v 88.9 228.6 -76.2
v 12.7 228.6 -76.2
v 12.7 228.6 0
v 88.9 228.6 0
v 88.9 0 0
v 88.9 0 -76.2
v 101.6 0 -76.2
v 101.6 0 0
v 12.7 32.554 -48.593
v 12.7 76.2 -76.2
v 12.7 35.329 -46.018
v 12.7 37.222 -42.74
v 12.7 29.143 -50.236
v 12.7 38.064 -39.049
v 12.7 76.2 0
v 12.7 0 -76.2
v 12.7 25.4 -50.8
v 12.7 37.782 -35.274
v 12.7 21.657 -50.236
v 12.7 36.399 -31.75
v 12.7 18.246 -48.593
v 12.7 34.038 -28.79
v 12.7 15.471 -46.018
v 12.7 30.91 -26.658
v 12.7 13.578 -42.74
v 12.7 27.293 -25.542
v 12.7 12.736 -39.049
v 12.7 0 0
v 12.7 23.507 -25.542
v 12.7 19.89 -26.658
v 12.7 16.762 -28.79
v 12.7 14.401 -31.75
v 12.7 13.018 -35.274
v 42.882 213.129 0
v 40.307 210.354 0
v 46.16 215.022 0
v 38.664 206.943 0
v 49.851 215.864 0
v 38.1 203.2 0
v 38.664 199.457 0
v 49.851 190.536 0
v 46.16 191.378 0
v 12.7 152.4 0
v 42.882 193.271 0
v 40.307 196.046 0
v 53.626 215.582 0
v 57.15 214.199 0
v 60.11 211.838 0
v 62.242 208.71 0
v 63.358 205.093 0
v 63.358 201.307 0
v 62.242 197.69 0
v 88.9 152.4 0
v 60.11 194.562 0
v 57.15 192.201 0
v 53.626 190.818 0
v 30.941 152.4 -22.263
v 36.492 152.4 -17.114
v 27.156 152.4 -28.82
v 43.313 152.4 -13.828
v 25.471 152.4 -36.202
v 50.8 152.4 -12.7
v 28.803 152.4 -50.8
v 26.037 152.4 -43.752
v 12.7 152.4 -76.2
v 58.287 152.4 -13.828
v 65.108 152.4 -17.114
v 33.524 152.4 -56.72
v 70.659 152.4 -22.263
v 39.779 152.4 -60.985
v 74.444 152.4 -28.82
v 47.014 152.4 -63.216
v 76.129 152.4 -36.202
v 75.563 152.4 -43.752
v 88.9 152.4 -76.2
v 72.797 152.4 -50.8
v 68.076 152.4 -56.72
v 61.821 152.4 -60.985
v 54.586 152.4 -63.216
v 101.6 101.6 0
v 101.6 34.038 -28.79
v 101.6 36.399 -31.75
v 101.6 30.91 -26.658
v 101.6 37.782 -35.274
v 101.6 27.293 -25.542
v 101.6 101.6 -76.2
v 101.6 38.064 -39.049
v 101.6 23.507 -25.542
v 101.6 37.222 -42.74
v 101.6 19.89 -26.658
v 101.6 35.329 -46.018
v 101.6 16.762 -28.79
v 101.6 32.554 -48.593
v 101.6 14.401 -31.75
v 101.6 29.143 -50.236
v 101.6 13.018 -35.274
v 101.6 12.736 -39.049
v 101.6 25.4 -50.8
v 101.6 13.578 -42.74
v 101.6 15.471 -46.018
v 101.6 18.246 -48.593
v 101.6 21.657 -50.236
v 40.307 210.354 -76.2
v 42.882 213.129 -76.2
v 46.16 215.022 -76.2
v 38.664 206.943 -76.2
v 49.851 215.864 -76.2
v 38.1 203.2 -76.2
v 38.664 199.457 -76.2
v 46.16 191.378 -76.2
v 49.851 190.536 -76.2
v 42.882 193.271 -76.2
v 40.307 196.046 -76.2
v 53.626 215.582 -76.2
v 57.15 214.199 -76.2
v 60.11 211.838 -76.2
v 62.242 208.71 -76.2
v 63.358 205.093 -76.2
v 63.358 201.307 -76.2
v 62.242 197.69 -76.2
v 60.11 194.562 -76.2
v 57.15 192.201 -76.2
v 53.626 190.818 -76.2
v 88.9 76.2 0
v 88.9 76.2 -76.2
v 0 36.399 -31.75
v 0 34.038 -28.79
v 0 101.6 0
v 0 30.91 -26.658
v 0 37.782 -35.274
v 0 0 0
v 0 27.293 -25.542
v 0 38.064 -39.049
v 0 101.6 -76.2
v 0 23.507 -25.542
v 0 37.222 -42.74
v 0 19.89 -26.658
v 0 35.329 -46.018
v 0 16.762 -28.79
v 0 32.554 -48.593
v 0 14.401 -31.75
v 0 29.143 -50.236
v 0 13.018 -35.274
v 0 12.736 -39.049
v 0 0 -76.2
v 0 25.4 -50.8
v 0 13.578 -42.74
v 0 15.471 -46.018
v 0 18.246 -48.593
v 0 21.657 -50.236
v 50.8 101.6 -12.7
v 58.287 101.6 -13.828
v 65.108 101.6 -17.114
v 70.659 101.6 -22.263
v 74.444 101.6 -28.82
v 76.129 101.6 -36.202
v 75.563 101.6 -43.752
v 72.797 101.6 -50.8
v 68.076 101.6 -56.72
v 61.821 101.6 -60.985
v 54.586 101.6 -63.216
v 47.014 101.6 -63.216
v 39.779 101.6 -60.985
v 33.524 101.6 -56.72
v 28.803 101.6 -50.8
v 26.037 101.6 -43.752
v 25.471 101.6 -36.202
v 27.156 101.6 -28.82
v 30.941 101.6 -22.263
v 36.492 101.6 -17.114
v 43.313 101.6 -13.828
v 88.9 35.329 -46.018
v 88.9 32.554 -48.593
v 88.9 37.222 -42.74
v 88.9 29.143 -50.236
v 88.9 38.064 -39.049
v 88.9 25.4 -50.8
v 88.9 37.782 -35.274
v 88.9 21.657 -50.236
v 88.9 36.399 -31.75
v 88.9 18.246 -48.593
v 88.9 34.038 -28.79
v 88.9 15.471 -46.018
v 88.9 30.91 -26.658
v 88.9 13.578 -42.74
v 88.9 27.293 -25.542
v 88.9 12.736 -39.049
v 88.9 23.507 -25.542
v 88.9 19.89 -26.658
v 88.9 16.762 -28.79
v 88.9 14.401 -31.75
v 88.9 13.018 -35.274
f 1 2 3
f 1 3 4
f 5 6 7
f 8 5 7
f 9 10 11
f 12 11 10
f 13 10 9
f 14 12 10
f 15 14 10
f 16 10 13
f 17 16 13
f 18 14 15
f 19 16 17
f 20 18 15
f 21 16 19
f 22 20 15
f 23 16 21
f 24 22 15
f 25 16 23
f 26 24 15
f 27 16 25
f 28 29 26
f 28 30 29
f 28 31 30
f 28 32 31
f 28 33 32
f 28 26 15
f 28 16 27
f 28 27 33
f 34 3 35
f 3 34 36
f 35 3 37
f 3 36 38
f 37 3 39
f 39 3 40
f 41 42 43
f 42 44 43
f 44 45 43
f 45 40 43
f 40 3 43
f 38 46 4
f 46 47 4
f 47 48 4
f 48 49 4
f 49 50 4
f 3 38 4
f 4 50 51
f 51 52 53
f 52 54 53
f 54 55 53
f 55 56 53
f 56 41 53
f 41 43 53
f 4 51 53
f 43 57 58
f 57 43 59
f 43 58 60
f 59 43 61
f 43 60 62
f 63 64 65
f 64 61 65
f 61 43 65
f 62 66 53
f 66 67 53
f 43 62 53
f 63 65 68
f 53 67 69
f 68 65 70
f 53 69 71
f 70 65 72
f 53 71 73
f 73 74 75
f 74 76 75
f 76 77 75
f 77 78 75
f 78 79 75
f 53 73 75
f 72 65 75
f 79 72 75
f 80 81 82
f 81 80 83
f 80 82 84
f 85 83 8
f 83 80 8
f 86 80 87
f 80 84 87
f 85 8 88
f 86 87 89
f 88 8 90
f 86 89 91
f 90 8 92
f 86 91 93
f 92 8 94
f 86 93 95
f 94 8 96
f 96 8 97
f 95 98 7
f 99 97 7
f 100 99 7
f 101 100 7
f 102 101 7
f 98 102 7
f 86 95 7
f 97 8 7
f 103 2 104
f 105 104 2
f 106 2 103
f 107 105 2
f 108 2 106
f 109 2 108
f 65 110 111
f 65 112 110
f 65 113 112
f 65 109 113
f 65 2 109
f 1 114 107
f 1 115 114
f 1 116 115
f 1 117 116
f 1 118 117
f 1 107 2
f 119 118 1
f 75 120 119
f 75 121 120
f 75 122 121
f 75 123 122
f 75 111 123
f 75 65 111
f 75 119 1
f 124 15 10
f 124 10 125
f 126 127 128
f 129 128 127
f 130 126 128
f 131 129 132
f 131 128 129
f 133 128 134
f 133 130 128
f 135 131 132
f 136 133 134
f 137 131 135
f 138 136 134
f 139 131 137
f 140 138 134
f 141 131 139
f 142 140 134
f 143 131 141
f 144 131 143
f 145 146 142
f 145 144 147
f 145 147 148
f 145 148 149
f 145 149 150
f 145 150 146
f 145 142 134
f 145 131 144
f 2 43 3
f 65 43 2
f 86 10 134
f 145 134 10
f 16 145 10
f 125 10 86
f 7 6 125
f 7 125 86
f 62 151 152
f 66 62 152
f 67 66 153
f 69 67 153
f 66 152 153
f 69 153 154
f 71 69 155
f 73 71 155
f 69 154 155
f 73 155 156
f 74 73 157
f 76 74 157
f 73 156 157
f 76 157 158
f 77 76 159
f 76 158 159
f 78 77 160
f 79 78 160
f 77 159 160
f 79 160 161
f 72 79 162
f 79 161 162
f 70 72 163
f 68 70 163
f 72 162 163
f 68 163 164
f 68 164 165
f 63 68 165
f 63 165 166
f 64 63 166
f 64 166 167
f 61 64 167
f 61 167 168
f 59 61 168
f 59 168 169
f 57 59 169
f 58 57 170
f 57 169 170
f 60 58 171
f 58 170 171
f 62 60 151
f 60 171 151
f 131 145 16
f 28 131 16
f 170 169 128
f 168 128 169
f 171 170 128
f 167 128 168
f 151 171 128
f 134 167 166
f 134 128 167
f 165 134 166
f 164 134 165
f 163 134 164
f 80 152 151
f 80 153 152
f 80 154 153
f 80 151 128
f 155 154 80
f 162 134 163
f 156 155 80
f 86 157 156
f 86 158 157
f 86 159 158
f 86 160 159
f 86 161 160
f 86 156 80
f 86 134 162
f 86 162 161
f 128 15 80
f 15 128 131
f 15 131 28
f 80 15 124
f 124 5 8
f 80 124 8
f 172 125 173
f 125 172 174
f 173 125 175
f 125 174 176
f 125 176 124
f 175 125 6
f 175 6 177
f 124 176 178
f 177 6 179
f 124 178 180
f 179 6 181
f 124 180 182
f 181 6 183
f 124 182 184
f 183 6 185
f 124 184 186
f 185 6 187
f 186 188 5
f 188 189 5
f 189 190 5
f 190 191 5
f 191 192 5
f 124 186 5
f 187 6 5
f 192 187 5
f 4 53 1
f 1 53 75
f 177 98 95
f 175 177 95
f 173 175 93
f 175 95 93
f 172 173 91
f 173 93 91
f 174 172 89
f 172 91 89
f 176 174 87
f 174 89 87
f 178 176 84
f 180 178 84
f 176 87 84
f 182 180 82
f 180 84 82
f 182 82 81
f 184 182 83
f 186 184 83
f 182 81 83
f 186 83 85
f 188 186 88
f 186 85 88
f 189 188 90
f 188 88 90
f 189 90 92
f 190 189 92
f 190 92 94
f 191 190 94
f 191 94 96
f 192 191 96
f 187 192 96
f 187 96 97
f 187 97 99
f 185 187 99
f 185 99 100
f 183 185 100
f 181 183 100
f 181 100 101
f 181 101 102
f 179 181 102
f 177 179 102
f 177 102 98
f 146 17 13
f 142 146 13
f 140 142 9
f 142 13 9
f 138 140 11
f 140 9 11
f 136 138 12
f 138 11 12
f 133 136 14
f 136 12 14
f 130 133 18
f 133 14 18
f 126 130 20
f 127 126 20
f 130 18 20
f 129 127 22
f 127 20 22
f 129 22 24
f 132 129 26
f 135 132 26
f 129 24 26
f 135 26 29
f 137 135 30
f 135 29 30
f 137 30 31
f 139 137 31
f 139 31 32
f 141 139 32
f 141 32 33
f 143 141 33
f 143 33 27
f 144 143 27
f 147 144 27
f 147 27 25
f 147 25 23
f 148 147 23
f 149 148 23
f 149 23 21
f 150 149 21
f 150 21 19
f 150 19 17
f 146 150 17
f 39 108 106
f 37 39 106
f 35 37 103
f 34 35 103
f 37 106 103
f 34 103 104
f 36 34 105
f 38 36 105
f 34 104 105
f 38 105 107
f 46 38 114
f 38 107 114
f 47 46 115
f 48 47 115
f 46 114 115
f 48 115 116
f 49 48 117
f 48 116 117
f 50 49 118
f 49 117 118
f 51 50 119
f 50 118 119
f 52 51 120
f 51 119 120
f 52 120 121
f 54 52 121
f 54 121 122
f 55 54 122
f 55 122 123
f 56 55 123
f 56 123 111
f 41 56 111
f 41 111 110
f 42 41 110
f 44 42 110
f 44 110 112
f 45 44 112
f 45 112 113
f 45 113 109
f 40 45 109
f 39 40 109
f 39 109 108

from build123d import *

# Parameters (mm, degrees)
SKETCH1_W           = 101.6
SKETCH1_H           = 76.2
BOSS_EXTRUDE1_DEPTH = 101.6
SKETCH3_W           = 76.2
SKETCH3_H           = 76.2
CUT_EXTRUDE1_DEPTH  = 76.2
SKETCH4_R           = 25.4
BOSS_EXTRUDE2_DEPTH = 50.8
SKETCH5_W           = 76.2
SKETCH5_H           = 76.2
BOSS_EXTRUDE3_DEPTH = 76.2
SKETCH6_R           = 12.7
CUT_EXTRUDE2_DEPTH  = 262.509005581
CUT_EXTRUDE3_REACH  = 263.509
SKETCH7_R           = 12.7


with BuildPart() as part:
    # Sketch1 → Boss-Extrude1 (new body)
    with BuildSketch(Plane(origin=(0, 0, 0), x_dir=(1, 0, 0), z_dir=(0, 1, 0))):
        with Locations((50.8, 38.1)):
            Rectangle(SKETCH1_W, SKETCH1_H)
    extrude(amount=BOSS_EXTRUDE1_DEPTH)

    # Sketch3 → Cut-Extrude1 (cut)
    with BuildSketch(Plane.XZ):
        with Locations((50.8, -38.1)):
            Rectangle(SKETCH3_W, SKETCH3_H)
    extrude(amount=-CUT_EXTRUDE1_DEPTH, mode=Mode.SUBTRACT)

    # Sketch4 → Boss-Extrude2 (add)
    with BuildSketch(Plane(origin=(0, 101.6, 0), x_dir=(1, 0, 0), z_dir=(0, 1, 0))):
        with Locations(Location((50.8, 38.1, 0), (0, 0, 270))):
            Circle(SKETCH4_R)
    extrude(amount=BOSS_EXTRUDE2_DEPTH)

    # Sketch5 → Boss-Extrude3 (add)
    with BuildSketch(Plane(origin=(0, 152.4, 0), x_dir=(1, 0, 0), z_dir=(0, 1, 0))):
        with Locations((50.8, 38.1)):
            Rectangle(SKETCH5_W, SKETCH5_H)
    extrude(amount=BOSS_EXTRUDE3_DEPTH)

    # Sketch6 → Cut-Extrude2 (cut, through all)
    with BuildSketch(Plane(origin=(101.6, 0, 0), x_dir=(0, 0, -1), z_dir=(1, 0, 0))):
        with Locations((38.1, 25.4)):
            Circle(SKETCH6_R)
    extrude(amount=-CUT_EXTRUDE2_DEPTH, mode=Mode.SUBTRACT)

    # Sketch7 → Cut-Extrude3 (cut, up to next)
    with BuildSketch(Plane(origin=(0, 0, -76.2), x_dir=(-1, 0, 0), z_dir=(0, 0, -1)), mode=Mode.PRIVATE) as cut_extrude3_sk1:
        with Locations((-50.8, 203.2)):
            Circle(SKETCH7_R)
    cut_extrude3_tool1 = extrude(cut_extrude3_sk1.sketch, amount=-CUT_EXTRUDE3_REACH, mode=Mode.PRIVATE) & part.part
    add(cut_extrude3_tool1.solids().sort_by_distance((50.8, 203.2, -76.2))[0], mode=Mode.SUBTRACT)


solid = part.part
